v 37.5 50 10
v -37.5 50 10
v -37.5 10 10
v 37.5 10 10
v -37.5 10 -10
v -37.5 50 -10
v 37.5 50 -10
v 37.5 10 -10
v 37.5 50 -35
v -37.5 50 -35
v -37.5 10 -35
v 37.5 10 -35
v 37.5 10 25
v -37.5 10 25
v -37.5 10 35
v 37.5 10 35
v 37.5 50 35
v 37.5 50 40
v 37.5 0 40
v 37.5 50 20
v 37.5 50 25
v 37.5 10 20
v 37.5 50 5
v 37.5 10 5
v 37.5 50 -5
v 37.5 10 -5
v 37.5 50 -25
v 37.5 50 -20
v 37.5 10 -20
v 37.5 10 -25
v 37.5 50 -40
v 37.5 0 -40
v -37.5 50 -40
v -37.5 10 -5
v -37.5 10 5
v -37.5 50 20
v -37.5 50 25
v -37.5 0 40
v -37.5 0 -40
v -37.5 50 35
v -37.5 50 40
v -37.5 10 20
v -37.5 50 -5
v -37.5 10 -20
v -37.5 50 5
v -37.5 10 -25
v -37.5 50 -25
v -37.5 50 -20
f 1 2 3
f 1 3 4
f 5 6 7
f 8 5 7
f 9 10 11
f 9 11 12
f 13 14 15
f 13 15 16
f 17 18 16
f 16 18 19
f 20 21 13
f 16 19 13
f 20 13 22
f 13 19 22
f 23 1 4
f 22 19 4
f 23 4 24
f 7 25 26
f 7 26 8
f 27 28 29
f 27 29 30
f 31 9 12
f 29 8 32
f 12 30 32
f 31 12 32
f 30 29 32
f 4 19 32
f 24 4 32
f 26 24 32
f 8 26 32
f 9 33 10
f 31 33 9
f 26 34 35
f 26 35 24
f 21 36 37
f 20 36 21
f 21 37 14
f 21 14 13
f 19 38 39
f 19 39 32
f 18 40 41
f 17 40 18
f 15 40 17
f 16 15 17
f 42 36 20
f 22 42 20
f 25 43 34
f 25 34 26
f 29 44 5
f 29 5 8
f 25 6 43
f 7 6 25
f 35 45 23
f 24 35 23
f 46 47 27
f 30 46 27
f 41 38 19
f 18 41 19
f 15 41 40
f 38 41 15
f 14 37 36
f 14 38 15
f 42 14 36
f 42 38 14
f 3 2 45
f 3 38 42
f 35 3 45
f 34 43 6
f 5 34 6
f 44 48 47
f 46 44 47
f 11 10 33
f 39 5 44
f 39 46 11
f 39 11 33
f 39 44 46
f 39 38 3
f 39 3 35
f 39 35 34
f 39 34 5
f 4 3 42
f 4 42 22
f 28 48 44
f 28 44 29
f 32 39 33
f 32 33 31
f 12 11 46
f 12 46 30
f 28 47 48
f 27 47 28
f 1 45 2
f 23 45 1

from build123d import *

# Parameters (mm, degrees)
SKETCH1_W           = 75
SKETCH1_H           = 80
BOSS_EXTRUDE1_DEPTH = 50
SKETCH2_W           = 75
SKETCH2_H           = 10
CUT_EXTRUDE1_DEPTH  = 40


with BuildPart() as part:
    # Sketch1 → Boss-Extrude1 (new body)
    with BuildSketch(Plane(origin=(0, 0, 0), x_dir=(1, 0, 0), z_dir=(0, 1, 0))):
        Rectangle(SKETCH1_W, SKETCH1_H)
    extrude(amount=BOSS_EXTRUDE1_DEPTH)

    # Sketch2 → Cut-Extrude1 (cut)
    with BuildSketch(Plane(origin=(0, 50, 0), x_dir=(1, 0, 0), z_dir=(0, 1, 0))):
        with Locations((0, 30)):
            Rectangle(SKETCH2_W, SKETCH2_H)
        with Locations((0, 15)):
            Rectangle(SKETCH2_W, SKETCH2_H)
        Rectangle(SKETCH2_W, SKETCH2_H)
        with Locations((0, -15)):
            Rectangle(SKETCH2_W, SKETCH2_H)
        with Locations((0, -30)):
            Rectangle(SKETCH2_W, SKETCH2_H)
    extrude(amount=-CUT_EXTRUDE1_DEPTH, mode=Mode.SUBTRACT)


solid = part.part
